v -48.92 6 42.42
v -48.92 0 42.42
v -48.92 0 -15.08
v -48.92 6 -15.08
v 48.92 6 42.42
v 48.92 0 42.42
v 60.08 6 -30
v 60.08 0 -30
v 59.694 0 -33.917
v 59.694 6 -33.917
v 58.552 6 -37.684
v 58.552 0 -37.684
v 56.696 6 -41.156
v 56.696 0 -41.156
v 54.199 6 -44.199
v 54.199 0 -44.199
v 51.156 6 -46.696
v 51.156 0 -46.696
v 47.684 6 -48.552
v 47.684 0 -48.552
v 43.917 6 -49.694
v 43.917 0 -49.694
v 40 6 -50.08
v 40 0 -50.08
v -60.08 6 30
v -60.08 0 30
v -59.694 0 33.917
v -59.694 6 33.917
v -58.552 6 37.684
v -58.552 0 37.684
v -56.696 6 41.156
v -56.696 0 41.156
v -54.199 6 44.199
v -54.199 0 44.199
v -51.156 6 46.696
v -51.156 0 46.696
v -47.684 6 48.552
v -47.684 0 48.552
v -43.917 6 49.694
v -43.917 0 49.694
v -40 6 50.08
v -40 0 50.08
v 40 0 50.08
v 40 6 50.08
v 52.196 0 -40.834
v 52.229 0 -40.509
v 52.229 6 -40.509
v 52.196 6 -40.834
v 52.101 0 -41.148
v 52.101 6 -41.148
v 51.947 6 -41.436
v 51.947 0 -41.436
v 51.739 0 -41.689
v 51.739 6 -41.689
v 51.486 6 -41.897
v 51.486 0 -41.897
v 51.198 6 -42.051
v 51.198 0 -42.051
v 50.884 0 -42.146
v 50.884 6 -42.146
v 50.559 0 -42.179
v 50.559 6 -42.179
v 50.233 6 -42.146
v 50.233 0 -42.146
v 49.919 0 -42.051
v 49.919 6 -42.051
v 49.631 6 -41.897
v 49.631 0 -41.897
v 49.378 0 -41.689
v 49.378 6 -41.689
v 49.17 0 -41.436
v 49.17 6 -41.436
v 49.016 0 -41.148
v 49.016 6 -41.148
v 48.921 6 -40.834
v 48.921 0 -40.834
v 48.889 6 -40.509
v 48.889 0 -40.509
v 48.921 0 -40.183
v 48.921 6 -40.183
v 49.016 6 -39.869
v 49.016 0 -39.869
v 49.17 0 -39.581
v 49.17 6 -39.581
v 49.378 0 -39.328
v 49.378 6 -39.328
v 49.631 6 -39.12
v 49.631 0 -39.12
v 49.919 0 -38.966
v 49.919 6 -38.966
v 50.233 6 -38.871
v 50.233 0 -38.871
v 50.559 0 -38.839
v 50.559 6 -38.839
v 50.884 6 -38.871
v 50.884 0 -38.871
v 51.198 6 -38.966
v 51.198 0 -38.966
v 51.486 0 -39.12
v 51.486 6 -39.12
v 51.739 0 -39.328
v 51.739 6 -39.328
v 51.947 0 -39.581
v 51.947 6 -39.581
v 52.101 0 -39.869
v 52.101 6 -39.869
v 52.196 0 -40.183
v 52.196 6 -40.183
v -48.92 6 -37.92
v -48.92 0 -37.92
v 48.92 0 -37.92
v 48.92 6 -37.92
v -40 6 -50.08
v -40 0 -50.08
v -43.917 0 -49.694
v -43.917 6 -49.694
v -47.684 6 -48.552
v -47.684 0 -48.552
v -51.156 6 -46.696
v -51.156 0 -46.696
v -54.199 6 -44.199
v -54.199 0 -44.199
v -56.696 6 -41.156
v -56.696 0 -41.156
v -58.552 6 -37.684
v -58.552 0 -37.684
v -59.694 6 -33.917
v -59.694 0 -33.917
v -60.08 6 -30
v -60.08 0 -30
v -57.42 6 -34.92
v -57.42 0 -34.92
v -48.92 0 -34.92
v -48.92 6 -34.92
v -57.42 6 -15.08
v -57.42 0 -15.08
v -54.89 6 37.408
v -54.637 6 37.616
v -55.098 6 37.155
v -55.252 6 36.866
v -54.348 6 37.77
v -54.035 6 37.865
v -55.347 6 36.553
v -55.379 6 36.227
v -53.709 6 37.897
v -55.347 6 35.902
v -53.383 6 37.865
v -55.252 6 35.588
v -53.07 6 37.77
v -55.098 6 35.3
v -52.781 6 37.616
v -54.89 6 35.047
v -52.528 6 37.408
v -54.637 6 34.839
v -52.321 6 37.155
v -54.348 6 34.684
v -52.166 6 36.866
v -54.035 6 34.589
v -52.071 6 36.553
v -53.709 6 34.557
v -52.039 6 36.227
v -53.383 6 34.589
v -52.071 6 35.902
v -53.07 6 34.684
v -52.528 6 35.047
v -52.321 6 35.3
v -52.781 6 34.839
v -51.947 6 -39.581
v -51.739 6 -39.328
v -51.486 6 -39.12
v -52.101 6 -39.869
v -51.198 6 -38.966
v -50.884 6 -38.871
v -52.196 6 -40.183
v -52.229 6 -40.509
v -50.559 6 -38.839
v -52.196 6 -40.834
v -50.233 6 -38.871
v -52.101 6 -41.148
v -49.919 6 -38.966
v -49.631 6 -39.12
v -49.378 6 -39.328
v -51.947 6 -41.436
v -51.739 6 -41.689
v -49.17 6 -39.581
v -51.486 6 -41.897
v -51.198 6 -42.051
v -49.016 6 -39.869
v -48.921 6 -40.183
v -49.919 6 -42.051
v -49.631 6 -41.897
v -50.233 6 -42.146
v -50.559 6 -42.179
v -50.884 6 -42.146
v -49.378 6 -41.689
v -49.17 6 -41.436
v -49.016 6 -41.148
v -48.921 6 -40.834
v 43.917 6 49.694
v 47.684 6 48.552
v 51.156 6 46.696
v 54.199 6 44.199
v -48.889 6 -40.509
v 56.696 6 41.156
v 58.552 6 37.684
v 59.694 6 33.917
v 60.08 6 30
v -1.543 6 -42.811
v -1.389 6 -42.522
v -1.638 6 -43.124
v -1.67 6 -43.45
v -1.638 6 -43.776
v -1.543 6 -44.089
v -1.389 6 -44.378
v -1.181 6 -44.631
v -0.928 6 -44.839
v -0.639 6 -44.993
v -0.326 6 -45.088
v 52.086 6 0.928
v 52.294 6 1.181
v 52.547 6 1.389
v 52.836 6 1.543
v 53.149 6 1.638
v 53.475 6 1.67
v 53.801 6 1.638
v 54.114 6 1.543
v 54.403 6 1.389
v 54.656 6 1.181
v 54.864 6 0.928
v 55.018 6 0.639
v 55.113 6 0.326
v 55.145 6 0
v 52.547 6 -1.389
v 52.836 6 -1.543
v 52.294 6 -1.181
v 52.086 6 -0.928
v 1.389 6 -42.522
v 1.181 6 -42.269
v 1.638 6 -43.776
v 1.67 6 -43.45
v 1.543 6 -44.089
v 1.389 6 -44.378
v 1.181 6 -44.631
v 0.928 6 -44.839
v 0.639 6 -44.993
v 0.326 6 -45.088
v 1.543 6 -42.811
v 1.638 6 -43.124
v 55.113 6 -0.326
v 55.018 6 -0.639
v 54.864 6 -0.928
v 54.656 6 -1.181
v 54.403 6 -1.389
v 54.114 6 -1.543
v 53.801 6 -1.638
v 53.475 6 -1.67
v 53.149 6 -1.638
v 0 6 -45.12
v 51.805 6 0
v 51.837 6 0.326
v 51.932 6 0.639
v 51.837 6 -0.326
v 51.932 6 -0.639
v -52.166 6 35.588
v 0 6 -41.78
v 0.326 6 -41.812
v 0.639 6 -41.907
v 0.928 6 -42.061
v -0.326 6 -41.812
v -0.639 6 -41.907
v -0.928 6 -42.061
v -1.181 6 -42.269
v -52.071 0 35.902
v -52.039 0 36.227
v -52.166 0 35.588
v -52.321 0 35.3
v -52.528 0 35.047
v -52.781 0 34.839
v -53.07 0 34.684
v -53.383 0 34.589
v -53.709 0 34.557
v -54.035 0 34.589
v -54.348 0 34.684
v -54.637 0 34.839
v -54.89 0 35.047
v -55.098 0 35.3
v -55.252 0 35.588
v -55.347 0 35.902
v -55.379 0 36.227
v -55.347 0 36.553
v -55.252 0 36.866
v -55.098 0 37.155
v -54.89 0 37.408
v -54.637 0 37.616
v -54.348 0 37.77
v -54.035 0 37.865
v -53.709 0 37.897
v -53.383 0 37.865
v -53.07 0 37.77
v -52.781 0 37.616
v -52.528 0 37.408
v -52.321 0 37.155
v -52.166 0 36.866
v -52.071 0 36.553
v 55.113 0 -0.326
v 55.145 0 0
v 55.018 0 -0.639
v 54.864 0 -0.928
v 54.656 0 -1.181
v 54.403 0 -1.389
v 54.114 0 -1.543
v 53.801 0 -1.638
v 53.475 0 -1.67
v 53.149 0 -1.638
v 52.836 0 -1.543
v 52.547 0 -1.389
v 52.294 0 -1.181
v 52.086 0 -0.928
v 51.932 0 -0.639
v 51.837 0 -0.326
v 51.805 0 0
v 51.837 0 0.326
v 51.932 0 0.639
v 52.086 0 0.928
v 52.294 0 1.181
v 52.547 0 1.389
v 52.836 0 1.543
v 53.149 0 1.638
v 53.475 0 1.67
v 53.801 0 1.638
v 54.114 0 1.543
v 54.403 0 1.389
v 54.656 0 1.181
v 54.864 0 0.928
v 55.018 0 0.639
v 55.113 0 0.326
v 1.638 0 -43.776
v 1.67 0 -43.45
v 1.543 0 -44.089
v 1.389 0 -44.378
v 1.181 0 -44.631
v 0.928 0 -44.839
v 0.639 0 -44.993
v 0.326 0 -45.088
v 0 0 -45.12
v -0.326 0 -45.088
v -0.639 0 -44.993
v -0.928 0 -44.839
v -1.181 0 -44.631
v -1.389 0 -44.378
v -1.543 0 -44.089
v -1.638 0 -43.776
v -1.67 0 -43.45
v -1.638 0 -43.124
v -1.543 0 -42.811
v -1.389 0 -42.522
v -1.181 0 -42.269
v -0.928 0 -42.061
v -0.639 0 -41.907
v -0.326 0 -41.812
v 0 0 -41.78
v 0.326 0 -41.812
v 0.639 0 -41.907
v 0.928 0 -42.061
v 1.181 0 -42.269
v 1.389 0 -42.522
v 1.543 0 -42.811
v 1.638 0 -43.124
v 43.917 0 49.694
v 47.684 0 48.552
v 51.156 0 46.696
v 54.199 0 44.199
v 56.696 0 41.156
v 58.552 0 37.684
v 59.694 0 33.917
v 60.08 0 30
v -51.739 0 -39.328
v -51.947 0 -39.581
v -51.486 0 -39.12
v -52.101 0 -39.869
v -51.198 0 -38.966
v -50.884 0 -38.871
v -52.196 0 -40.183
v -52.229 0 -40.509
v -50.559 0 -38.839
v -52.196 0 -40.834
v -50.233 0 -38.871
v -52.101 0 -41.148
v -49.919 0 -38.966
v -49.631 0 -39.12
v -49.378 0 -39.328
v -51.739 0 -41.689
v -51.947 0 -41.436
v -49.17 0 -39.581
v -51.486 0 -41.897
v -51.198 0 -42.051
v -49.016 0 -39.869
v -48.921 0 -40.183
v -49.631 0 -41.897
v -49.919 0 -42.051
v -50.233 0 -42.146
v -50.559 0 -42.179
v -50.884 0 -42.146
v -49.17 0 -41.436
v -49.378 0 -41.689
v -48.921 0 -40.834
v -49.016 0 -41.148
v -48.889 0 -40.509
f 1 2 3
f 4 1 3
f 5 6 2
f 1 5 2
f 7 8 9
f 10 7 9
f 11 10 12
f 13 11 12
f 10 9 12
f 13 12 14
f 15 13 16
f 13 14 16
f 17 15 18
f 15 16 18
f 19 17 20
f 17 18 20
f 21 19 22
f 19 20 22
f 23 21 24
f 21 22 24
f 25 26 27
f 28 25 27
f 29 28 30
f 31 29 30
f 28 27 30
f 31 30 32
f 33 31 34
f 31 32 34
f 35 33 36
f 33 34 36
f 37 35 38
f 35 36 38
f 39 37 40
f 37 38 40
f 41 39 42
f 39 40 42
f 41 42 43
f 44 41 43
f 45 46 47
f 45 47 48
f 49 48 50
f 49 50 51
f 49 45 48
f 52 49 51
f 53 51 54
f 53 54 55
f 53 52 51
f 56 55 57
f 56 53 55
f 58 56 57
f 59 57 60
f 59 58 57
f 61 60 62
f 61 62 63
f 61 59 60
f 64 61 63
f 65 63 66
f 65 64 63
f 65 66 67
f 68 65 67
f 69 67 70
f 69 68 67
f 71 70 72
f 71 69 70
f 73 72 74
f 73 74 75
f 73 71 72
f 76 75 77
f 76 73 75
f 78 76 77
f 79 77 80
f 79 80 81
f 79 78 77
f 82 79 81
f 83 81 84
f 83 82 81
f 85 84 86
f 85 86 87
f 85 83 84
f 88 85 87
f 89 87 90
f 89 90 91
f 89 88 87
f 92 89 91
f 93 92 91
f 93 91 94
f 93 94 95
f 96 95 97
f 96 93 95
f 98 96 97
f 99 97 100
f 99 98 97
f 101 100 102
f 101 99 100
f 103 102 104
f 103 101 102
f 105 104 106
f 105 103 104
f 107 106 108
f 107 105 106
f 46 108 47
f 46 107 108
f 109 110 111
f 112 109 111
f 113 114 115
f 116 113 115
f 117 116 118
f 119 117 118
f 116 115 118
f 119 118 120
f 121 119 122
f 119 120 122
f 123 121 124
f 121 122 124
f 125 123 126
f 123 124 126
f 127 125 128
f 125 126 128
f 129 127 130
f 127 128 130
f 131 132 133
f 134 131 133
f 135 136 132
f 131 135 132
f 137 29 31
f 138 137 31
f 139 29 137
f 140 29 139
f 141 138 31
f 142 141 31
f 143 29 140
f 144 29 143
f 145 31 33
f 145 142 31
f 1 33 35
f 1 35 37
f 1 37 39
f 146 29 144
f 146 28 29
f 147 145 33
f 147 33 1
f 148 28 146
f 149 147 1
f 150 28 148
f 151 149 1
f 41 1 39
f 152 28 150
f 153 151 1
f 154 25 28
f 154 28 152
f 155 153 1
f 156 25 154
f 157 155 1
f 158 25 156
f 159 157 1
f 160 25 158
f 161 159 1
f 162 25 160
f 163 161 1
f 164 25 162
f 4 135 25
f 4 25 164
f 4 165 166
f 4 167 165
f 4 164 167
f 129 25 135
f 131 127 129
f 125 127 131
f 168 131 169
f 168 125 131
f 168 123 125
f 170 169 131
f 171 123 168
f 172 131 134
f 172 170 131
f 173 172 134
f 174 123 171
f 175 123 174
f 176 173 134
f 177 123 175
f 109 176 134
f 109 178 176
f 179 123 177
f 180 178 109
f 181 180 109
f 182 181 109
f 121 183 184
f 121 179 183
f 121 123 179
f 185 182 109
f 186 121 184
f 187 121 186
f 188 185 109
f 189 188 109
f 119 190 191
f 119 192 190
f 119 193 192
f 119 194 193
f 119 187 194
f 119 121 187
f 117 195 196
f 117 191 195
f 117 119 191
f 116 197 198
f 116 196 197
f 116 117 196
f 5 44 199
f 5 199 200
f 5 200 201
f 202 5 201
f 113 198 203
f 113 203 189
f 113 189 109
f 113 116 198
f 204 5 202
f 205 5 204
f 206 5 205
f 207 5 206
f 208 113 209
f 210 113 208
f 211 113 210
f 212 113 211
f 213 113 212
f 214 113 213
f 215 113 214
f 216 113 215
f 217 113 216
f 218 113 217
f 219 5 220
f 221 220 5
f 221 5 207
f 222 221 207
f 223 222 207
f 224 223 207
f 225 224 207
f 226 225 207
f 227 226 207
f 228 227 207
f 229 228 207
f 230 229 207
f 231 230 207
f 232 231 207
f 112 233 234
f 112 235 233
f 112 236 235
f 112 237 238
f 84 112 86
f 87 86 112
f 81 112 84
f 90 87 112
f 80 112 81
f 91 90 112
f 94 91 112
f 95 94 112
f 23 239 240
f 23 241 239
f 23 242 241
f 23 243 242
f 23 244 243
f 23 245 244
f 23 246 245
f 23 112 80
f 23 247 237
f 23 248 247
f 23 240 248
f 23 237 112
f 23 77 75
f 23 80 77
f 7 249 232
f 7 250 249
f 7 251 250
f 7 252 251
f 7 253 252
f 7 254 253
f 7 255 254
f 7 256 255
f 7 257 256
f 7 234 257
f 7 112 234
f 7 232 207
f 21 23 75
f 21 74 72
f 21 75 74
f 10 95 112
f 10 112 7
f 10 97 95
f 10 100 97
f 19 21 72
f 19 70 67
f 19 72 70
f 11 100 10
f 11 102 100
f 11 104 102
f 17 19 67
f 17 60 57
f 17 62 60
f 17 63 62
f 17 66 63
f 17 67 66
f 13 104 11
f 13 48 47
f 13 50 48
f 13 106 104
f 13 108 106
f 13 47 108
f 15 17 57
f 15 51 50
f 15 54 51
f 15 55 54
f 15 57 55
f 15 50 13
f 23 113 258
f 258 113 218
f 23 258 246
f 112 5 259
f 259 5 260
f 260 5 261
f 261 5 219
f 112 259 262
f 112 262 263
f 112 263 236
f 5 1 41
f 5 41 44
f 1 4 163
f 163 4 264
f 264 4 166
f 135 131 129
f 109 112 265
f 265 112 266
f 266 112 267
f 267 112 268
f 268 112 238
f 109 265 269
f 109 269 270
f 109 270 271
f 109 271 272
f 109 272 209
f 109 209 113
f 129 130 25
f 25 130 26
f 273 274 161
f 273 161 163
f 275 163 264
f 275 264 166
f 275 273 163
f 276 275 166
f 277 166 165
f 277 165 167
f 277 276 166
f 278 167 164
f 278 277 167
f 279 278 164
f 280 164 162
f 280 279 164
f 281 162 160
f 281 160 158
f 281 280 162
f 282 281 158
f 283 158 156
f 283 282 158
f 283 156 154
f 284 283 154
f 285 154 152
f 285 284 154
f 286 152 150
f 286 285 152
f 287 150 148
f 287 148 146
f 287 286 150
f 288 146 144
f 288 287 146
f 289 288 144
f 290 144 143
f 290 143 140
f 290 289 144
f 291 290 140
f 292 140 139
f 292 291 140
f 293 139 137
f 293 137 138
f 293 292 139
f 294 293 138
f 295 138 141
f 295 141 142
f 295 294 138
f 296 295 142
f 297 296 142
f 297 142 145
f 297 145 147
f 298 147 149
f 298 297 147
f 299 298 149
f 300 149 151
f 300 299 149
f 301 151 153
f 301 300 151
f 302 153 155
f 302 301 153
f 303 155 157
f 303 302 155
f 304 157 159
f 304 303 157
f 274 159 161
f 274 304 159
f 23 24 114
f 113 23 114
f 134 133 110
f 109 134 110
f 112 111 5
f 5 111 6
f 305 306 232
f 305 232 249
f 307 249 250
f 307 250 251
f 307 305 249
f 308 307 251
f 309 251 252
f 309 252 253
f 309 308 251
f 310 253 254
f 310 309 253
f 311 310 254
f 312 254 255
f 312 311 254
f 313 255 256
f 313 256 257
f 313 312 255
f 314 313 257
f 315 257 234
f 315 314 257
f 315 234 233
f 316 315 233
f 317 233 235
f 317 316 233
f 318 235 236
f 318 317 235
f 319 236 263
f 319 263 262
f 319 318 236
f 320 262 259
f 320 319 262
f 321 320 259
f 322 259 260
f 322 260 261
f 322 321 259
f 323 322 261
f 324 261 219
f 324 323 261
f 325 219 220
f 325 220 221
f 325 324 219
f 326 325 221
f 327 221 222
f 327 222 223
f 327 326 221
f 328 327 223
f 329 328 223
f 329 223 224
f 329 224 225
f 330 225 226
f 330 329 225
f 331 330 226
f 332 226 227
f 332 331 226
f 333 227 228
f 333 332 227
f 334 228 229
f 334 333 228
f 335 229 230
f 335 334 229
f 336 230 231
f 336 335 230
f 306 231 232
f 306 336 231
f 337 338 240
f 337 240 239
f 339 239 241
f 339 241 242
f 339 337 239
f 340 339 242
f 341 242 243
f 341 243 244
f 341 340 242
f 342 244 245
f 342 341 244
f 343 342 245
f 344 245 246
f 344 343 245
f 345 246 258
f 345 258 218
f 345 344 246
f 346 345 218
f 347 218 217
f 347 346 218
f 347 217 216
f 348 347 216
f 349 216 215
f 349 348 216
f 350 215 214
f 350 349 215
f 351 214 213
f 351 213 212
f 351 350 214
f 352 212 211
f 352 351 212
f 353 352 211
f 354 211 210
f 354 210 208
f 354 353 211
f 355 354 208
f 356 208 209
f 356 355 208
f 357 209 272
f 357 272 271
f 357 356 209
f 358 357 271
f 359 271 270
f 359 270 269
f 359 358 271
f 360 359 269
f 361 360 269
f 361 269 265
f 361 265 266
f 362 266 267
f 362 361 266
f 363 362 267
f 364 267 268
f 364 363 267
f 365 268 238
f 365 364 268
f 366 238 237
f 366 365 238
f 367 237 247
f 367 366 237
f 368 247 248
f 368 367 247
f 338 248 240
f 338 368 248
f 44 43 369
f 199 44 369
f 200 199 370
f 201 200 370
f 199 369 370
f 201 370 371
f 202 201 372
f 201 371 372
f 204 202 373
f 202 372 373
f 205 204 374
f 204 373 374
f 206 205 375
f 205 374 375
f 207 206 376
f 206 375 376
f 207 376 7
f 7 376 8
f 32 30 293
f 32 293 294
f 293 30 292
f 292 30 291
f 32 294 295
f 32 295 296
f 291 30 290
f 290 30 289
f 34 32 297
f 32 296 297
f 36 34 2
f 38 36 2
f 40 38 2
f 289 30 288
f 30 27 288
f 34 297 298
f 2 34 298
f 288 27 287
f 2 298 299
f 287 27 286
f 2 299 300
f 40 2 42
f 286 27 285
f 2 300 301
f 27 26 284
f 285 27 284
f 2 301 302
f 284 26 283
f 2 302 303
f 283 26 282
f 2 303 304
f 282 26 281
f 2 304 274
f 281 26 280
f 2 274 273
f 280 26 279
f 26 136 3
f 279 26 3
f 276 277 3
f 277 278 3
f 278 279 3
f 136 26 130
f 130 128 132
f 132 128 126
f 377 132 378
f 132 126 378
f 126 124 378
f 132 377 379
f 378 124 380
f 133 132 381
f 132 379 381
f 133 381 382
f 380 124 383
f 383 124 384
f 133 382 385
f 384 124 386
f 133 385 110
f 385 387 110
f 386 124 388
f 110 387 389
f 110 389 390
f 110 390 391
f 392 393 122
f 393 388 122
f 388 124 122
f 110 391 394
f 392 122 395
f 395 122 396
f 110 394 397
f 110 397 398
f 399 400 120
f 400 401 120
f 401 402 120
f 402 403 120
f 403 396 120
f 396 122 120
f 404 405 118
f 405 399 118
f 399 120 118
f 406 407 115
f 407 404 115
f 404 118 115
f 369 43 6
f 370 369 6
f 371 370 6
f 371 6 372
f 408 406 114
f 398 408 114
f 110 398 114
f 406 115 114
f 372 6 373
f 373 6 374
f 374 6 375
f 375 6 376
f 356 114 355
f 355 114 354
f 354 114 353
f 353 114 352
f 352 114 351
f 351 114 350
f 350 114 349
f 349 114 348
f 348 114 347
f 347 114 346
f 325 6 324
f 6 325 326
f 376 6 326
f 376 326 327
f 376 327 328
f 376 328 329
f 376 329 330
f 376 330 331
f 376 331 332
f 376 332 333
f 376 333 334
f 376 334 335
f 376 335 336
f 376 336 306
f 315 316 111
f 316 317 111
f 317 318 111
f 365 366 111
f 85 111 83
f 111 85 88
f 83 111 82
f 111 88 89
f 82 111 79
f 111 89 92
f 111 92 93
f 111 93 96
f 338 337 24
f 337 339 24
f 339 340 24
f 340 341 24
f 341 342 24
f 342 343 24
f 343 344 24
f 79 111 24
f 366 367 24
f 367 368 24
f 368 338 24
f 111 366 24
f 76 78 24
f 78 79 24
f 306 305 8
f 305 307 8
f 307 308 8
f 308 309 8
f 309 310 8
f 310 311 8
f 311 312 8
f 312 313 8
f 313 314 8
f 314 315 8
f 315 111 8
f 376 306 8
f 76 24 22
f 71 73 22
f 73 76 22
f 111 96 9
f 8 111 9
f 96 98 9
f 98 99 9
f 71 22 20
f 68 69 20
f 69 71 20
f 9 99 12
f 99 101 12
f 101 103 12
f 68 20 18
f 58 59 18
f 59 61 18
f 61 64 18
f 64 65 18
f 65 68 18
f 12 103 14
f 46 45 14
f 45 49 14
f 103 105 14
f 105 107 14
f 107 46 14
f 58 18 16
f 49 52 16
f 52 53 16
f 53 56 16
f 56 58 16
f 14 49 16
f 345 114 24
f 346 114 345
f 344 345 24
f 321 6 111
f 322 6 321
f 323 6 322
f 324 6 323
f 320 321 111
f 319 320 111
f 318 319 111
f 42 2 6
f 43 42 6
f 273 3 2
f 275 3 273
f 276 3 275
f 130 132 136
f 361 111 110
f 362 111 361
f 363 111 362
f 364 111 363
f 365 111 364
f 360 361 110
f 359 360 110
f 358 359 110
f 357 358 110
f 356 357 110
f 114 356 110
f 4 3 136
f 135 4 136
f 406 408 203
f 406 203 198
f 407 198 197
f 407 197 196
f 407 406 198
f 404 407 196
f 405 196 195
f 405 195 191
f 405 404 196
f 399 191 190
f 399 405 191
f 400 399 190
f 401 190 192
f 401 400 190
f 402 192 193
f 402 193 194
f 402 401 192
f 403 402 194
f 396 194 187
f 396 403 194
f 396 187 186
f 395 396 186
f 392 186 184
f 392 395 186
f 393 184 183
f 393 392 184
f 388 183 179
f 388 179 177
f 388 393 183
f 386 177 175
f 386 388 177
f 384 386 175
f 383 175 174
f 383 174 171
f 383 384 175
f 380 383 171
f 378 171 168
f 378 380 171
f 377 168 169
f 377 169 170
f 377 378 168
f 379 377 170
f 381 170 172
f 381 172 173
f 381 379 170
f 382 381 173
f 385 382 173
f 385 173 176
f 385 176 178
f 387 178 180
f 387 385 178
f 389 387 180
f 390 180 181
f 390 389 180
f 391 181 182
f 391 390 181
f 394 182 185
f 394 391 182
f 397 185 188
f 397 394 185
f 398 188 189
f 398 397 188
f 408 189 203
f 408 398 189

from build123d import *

# Parameters (mm, degrees)
BOSS_EXTRUDE1_DEPTH    = 6
SKETCH2_W              = 98
SKETCH2_H              = 80.5
CUT_EXTRUDE1_DEPTH     = 79.33262411
SKETCH5_R              = 1.75
CUT_EXTRUDE4_DEPTH     = 79.33262411
SKETCH6_W              = 8.5
SKETCH6_H              = 20
CUT_EXTRUDE5_DEPTH     = 79.33262411
MOVE_FACE1_OUTLINE_R   = 1.75
MOVE_FACE1_OUTLINE_R_2 = 1.67
MOVE_FACE1_DEPTH       = 6


# Read off the part's stored shape, not the designer's step: Move Face1
with BuildPart() as part:
    # Sketch1 → Boss-Extrude1 (new body)
    with BuildSketch(Plane(origin=(0, 0, 0), x_dir=(1, 0, 0), z_dir=(0, 1, 0))):
        with BuildLine():
            Line((-60, 30), (-60, -30))
            ThreePointArc((-60, -30), (-54.142135624, -44.142135624), (-40, -50))
            Line((-40, -50), (40, -50))
            ThreePointArc((40, -50), (54.142135624, -44.142135624), (60, -30))
            Line((60, -30), (60, 30))
            ThreePointArc((60, 30), (54.142135624, 44.142135624), (40, 50))
            Line((40, 50), (-40, 50))
            ThreePointArc((-40, 50), (-54.142135624, 44.142135624), (-60, 30))
        make_face()
    extrude(amount=BOSS_EXTRUDE1_DEPTH)

    # Sketch2 → Cut-Extrude1 (cut, through all)
    with BuildSketch(Plane(origin=(0, 6, 0), x_dir=(1, 0, 0), z_dir=(0, 1, 0))):
        with Locations((0, -2.25)):
            Rectangle(SKETCH2_W, SKETCH2_H)
    extrude(amount=-CUT_EXTRUDE1_DEPTH, mode=Mode.SUBTRACT)

    # Sketch5 → Cut-Extrude4 (cut, through all)
    with BuildSketch(Plane(origin=(0, 6, 0), x_dir=(1, 0, 0), z_dir=(0, 1, 0))):
        with Locations(Location((53.475, 0, 0), (0, 0, 270))):
            Circle(SKETCH5_R)
        with Locations(Location((-53.709292606, -36.227375296, 0), (0, 0, 270))):
            Circle(SKETCH5_R)
        with Locations(Location((0, 43.45, 0), (0, 0, 270))):
            Circle(SKETCH5_R)
        with Locations(Location((50.558556763, 40.508556763, 0), (0, 0, 270))):
            Circle(SKETCH5_R)
        with Locations(Location((-50.558556763, 40.508556763, 0), (0, 0, 90))):
            Circle(SKETCH5_R)
    extrude(amount=-CUT_EXTRUDE4_DEPTH, mode=Mode.SUBTRACT)

    # Sketch6 → Cut-Extrude5 (cut, through all)
    with BuildSketch(Plane(origin=(0, 6, 0), x_dir=(1, 0, 0), z_dir=(0, 1, 0))):
        with Locations((-53.25, 25)):
            Rectangle(SKETCH6_W, SKETCH6_H)
    extrude(amount=-CUT_EXTRUDE5_DEPTH, mode=Mode.SUBTRACT)

    # Move Face1 outline → Move Face1 (add)
    # profile 1 of 7: a face of its own
    with BuildSketch(Plane(origin=(0, 0, 0), x_dir=(1, 0, 0), z_dir=(0, 1, 0))):
        with BuildLine():
            ThreePointArc((-40, 50.08), (-54.198704166, 44.198704166), (-60.08, 30))
            Line((-60.08, 30), (-60.08, -30))
            ThreePointArc((-60.08, -30), (-54.198704166, -44.198704166), (-40, -50.08))
            Line((-40, -50.08), (40, -50.08))
            ThreePointArc((40, -50.08), (54.198704166, -44.198704166), (60.08, -30))
            Line((60.08, -30), (60.08, 30))
            ThreePointArc((60.08, 30), (54.198704166, 44.198704166), (40, 50.08))
            Line((40, 50.08), (-40, 50.08))
        make_face()
        with BuildLine():
            Line((-60, -30), (-60, 30))
            ThreePointArc((-60, 30), (-54.142135624, 44.142135624), (-40, 50))
            Line((-40, 50), (40, 50))
            ThreePointArc((40, 50), (54.142135624, 44.142135624), (60, 30))
            Line((60, 30), (60, -30))
            ThreePointArc((60, -30), (54.142135624, -44.142135624), (40, -50))
            Line((40, -50), (-40, -50))
            ThreePointArc((-40, -50), (-54.142135624, -44.142135624), (-60, -30))
        make_face(mode=Mode.SUBTRACT)
    # profile 2 of 7: a face of its own
    with BuildSketch(Plane(origin=(0, 0, 0), x_dir=(1, 0, 0), z_dir=(0, 1, 0))):
        Polygon((-57.5, 15), (-49, 15), (-49, -42.5), (49, -42.5), (49, 38), (-49, 38), (-49, 35), (-57.5, 35), align=None)
        Polygon((-48.92, -42.42), (-48.92, 15.08), (-57.42, 15.08), (-57.42, 34.92), (-48.92, 34.92), (-48.92, 37.92), (48.92, 37.92), (48.92, -42.42), align=None, mode=Mode.SUBTRACT)
    # profile 3 of 7: a face of its own
    with BuildSketch(Plane(origin=(0, 0, 0), x_dir=(1, 0, 0), z_dir=(0, 1, 0))):
        with Locations((53.475, 0)):
            Circle(MOVE_FACE1_OUTLINE_R)
        with Locations((53.475, 0)):
            Circle(MOVE_FACE1_OUTLINE_R_2, mode=Mode.SUBTRACT)
    # profile 4 of 7: a face of its own
    with BuildSketch(Plane(origin=(0, 0, 0), x_dir=(1, 0, 0), z_dir=(0, 1, 0))):
        with Locations((0, 43.45)):
            Circle(MOVE_FACE1_OUTLINE_R)
        with Locations((0, 43.45)):
            Circle(MOVE_FACE1_OUTLINE_R_2, mode=Mode.SUBTRACT)
    # profile 5 of 7: a face of its own
    with BuildSketch(Plane(origin=(0, 0, 0), x_dir=(1, 0, 0), z_dir=(0, 1, 0))):
        with Locations((50.558556763, 40.508556763)):
            Circle(MOVE_FACE1_OUTLINE_R)
        with Locations((50.558556763, 40.508556763)):
            Circle(MOVE_FACE1_OUTLINE_R_2, mode=Mode.SUBTRACT)
    # profile 6 of 7: a face of its own
    with BuildSketch(Plane(origin=(0, 0, 0), x_dir=(1, 0, 0), z_dir=(0, 1, 0))):
        with Locations((-50.558556763, 40.508556763)):
            Circle(MOVE_FACE1_OUTLINE_R)
        with Locations((-50.558556763, 40.508556763)):
            Circle(MOVE_FACE1_OUTLINE_R_2, mode=Mode.SUBTRACT)
    # profile 7 of 7: a face of its own
    with BuildSketch(Plane(origin=(0, 0, 0), x_dir=(1, 0, 0), z_dir=(0, 1, 0))):
        with Locations((-53.709292606, -36.227375296)):
            Circle(MOVE_FACE1_OUTLINE_R)
        with Locations((-53.709292606, -36.227375296)):
            Circle(MOVE_FACE1_OUTLINE_R_2, mode=Mode.SUBTRACT)
    extrude(amount=MOVE_FACE1_DEPTH)


solid = part.part
